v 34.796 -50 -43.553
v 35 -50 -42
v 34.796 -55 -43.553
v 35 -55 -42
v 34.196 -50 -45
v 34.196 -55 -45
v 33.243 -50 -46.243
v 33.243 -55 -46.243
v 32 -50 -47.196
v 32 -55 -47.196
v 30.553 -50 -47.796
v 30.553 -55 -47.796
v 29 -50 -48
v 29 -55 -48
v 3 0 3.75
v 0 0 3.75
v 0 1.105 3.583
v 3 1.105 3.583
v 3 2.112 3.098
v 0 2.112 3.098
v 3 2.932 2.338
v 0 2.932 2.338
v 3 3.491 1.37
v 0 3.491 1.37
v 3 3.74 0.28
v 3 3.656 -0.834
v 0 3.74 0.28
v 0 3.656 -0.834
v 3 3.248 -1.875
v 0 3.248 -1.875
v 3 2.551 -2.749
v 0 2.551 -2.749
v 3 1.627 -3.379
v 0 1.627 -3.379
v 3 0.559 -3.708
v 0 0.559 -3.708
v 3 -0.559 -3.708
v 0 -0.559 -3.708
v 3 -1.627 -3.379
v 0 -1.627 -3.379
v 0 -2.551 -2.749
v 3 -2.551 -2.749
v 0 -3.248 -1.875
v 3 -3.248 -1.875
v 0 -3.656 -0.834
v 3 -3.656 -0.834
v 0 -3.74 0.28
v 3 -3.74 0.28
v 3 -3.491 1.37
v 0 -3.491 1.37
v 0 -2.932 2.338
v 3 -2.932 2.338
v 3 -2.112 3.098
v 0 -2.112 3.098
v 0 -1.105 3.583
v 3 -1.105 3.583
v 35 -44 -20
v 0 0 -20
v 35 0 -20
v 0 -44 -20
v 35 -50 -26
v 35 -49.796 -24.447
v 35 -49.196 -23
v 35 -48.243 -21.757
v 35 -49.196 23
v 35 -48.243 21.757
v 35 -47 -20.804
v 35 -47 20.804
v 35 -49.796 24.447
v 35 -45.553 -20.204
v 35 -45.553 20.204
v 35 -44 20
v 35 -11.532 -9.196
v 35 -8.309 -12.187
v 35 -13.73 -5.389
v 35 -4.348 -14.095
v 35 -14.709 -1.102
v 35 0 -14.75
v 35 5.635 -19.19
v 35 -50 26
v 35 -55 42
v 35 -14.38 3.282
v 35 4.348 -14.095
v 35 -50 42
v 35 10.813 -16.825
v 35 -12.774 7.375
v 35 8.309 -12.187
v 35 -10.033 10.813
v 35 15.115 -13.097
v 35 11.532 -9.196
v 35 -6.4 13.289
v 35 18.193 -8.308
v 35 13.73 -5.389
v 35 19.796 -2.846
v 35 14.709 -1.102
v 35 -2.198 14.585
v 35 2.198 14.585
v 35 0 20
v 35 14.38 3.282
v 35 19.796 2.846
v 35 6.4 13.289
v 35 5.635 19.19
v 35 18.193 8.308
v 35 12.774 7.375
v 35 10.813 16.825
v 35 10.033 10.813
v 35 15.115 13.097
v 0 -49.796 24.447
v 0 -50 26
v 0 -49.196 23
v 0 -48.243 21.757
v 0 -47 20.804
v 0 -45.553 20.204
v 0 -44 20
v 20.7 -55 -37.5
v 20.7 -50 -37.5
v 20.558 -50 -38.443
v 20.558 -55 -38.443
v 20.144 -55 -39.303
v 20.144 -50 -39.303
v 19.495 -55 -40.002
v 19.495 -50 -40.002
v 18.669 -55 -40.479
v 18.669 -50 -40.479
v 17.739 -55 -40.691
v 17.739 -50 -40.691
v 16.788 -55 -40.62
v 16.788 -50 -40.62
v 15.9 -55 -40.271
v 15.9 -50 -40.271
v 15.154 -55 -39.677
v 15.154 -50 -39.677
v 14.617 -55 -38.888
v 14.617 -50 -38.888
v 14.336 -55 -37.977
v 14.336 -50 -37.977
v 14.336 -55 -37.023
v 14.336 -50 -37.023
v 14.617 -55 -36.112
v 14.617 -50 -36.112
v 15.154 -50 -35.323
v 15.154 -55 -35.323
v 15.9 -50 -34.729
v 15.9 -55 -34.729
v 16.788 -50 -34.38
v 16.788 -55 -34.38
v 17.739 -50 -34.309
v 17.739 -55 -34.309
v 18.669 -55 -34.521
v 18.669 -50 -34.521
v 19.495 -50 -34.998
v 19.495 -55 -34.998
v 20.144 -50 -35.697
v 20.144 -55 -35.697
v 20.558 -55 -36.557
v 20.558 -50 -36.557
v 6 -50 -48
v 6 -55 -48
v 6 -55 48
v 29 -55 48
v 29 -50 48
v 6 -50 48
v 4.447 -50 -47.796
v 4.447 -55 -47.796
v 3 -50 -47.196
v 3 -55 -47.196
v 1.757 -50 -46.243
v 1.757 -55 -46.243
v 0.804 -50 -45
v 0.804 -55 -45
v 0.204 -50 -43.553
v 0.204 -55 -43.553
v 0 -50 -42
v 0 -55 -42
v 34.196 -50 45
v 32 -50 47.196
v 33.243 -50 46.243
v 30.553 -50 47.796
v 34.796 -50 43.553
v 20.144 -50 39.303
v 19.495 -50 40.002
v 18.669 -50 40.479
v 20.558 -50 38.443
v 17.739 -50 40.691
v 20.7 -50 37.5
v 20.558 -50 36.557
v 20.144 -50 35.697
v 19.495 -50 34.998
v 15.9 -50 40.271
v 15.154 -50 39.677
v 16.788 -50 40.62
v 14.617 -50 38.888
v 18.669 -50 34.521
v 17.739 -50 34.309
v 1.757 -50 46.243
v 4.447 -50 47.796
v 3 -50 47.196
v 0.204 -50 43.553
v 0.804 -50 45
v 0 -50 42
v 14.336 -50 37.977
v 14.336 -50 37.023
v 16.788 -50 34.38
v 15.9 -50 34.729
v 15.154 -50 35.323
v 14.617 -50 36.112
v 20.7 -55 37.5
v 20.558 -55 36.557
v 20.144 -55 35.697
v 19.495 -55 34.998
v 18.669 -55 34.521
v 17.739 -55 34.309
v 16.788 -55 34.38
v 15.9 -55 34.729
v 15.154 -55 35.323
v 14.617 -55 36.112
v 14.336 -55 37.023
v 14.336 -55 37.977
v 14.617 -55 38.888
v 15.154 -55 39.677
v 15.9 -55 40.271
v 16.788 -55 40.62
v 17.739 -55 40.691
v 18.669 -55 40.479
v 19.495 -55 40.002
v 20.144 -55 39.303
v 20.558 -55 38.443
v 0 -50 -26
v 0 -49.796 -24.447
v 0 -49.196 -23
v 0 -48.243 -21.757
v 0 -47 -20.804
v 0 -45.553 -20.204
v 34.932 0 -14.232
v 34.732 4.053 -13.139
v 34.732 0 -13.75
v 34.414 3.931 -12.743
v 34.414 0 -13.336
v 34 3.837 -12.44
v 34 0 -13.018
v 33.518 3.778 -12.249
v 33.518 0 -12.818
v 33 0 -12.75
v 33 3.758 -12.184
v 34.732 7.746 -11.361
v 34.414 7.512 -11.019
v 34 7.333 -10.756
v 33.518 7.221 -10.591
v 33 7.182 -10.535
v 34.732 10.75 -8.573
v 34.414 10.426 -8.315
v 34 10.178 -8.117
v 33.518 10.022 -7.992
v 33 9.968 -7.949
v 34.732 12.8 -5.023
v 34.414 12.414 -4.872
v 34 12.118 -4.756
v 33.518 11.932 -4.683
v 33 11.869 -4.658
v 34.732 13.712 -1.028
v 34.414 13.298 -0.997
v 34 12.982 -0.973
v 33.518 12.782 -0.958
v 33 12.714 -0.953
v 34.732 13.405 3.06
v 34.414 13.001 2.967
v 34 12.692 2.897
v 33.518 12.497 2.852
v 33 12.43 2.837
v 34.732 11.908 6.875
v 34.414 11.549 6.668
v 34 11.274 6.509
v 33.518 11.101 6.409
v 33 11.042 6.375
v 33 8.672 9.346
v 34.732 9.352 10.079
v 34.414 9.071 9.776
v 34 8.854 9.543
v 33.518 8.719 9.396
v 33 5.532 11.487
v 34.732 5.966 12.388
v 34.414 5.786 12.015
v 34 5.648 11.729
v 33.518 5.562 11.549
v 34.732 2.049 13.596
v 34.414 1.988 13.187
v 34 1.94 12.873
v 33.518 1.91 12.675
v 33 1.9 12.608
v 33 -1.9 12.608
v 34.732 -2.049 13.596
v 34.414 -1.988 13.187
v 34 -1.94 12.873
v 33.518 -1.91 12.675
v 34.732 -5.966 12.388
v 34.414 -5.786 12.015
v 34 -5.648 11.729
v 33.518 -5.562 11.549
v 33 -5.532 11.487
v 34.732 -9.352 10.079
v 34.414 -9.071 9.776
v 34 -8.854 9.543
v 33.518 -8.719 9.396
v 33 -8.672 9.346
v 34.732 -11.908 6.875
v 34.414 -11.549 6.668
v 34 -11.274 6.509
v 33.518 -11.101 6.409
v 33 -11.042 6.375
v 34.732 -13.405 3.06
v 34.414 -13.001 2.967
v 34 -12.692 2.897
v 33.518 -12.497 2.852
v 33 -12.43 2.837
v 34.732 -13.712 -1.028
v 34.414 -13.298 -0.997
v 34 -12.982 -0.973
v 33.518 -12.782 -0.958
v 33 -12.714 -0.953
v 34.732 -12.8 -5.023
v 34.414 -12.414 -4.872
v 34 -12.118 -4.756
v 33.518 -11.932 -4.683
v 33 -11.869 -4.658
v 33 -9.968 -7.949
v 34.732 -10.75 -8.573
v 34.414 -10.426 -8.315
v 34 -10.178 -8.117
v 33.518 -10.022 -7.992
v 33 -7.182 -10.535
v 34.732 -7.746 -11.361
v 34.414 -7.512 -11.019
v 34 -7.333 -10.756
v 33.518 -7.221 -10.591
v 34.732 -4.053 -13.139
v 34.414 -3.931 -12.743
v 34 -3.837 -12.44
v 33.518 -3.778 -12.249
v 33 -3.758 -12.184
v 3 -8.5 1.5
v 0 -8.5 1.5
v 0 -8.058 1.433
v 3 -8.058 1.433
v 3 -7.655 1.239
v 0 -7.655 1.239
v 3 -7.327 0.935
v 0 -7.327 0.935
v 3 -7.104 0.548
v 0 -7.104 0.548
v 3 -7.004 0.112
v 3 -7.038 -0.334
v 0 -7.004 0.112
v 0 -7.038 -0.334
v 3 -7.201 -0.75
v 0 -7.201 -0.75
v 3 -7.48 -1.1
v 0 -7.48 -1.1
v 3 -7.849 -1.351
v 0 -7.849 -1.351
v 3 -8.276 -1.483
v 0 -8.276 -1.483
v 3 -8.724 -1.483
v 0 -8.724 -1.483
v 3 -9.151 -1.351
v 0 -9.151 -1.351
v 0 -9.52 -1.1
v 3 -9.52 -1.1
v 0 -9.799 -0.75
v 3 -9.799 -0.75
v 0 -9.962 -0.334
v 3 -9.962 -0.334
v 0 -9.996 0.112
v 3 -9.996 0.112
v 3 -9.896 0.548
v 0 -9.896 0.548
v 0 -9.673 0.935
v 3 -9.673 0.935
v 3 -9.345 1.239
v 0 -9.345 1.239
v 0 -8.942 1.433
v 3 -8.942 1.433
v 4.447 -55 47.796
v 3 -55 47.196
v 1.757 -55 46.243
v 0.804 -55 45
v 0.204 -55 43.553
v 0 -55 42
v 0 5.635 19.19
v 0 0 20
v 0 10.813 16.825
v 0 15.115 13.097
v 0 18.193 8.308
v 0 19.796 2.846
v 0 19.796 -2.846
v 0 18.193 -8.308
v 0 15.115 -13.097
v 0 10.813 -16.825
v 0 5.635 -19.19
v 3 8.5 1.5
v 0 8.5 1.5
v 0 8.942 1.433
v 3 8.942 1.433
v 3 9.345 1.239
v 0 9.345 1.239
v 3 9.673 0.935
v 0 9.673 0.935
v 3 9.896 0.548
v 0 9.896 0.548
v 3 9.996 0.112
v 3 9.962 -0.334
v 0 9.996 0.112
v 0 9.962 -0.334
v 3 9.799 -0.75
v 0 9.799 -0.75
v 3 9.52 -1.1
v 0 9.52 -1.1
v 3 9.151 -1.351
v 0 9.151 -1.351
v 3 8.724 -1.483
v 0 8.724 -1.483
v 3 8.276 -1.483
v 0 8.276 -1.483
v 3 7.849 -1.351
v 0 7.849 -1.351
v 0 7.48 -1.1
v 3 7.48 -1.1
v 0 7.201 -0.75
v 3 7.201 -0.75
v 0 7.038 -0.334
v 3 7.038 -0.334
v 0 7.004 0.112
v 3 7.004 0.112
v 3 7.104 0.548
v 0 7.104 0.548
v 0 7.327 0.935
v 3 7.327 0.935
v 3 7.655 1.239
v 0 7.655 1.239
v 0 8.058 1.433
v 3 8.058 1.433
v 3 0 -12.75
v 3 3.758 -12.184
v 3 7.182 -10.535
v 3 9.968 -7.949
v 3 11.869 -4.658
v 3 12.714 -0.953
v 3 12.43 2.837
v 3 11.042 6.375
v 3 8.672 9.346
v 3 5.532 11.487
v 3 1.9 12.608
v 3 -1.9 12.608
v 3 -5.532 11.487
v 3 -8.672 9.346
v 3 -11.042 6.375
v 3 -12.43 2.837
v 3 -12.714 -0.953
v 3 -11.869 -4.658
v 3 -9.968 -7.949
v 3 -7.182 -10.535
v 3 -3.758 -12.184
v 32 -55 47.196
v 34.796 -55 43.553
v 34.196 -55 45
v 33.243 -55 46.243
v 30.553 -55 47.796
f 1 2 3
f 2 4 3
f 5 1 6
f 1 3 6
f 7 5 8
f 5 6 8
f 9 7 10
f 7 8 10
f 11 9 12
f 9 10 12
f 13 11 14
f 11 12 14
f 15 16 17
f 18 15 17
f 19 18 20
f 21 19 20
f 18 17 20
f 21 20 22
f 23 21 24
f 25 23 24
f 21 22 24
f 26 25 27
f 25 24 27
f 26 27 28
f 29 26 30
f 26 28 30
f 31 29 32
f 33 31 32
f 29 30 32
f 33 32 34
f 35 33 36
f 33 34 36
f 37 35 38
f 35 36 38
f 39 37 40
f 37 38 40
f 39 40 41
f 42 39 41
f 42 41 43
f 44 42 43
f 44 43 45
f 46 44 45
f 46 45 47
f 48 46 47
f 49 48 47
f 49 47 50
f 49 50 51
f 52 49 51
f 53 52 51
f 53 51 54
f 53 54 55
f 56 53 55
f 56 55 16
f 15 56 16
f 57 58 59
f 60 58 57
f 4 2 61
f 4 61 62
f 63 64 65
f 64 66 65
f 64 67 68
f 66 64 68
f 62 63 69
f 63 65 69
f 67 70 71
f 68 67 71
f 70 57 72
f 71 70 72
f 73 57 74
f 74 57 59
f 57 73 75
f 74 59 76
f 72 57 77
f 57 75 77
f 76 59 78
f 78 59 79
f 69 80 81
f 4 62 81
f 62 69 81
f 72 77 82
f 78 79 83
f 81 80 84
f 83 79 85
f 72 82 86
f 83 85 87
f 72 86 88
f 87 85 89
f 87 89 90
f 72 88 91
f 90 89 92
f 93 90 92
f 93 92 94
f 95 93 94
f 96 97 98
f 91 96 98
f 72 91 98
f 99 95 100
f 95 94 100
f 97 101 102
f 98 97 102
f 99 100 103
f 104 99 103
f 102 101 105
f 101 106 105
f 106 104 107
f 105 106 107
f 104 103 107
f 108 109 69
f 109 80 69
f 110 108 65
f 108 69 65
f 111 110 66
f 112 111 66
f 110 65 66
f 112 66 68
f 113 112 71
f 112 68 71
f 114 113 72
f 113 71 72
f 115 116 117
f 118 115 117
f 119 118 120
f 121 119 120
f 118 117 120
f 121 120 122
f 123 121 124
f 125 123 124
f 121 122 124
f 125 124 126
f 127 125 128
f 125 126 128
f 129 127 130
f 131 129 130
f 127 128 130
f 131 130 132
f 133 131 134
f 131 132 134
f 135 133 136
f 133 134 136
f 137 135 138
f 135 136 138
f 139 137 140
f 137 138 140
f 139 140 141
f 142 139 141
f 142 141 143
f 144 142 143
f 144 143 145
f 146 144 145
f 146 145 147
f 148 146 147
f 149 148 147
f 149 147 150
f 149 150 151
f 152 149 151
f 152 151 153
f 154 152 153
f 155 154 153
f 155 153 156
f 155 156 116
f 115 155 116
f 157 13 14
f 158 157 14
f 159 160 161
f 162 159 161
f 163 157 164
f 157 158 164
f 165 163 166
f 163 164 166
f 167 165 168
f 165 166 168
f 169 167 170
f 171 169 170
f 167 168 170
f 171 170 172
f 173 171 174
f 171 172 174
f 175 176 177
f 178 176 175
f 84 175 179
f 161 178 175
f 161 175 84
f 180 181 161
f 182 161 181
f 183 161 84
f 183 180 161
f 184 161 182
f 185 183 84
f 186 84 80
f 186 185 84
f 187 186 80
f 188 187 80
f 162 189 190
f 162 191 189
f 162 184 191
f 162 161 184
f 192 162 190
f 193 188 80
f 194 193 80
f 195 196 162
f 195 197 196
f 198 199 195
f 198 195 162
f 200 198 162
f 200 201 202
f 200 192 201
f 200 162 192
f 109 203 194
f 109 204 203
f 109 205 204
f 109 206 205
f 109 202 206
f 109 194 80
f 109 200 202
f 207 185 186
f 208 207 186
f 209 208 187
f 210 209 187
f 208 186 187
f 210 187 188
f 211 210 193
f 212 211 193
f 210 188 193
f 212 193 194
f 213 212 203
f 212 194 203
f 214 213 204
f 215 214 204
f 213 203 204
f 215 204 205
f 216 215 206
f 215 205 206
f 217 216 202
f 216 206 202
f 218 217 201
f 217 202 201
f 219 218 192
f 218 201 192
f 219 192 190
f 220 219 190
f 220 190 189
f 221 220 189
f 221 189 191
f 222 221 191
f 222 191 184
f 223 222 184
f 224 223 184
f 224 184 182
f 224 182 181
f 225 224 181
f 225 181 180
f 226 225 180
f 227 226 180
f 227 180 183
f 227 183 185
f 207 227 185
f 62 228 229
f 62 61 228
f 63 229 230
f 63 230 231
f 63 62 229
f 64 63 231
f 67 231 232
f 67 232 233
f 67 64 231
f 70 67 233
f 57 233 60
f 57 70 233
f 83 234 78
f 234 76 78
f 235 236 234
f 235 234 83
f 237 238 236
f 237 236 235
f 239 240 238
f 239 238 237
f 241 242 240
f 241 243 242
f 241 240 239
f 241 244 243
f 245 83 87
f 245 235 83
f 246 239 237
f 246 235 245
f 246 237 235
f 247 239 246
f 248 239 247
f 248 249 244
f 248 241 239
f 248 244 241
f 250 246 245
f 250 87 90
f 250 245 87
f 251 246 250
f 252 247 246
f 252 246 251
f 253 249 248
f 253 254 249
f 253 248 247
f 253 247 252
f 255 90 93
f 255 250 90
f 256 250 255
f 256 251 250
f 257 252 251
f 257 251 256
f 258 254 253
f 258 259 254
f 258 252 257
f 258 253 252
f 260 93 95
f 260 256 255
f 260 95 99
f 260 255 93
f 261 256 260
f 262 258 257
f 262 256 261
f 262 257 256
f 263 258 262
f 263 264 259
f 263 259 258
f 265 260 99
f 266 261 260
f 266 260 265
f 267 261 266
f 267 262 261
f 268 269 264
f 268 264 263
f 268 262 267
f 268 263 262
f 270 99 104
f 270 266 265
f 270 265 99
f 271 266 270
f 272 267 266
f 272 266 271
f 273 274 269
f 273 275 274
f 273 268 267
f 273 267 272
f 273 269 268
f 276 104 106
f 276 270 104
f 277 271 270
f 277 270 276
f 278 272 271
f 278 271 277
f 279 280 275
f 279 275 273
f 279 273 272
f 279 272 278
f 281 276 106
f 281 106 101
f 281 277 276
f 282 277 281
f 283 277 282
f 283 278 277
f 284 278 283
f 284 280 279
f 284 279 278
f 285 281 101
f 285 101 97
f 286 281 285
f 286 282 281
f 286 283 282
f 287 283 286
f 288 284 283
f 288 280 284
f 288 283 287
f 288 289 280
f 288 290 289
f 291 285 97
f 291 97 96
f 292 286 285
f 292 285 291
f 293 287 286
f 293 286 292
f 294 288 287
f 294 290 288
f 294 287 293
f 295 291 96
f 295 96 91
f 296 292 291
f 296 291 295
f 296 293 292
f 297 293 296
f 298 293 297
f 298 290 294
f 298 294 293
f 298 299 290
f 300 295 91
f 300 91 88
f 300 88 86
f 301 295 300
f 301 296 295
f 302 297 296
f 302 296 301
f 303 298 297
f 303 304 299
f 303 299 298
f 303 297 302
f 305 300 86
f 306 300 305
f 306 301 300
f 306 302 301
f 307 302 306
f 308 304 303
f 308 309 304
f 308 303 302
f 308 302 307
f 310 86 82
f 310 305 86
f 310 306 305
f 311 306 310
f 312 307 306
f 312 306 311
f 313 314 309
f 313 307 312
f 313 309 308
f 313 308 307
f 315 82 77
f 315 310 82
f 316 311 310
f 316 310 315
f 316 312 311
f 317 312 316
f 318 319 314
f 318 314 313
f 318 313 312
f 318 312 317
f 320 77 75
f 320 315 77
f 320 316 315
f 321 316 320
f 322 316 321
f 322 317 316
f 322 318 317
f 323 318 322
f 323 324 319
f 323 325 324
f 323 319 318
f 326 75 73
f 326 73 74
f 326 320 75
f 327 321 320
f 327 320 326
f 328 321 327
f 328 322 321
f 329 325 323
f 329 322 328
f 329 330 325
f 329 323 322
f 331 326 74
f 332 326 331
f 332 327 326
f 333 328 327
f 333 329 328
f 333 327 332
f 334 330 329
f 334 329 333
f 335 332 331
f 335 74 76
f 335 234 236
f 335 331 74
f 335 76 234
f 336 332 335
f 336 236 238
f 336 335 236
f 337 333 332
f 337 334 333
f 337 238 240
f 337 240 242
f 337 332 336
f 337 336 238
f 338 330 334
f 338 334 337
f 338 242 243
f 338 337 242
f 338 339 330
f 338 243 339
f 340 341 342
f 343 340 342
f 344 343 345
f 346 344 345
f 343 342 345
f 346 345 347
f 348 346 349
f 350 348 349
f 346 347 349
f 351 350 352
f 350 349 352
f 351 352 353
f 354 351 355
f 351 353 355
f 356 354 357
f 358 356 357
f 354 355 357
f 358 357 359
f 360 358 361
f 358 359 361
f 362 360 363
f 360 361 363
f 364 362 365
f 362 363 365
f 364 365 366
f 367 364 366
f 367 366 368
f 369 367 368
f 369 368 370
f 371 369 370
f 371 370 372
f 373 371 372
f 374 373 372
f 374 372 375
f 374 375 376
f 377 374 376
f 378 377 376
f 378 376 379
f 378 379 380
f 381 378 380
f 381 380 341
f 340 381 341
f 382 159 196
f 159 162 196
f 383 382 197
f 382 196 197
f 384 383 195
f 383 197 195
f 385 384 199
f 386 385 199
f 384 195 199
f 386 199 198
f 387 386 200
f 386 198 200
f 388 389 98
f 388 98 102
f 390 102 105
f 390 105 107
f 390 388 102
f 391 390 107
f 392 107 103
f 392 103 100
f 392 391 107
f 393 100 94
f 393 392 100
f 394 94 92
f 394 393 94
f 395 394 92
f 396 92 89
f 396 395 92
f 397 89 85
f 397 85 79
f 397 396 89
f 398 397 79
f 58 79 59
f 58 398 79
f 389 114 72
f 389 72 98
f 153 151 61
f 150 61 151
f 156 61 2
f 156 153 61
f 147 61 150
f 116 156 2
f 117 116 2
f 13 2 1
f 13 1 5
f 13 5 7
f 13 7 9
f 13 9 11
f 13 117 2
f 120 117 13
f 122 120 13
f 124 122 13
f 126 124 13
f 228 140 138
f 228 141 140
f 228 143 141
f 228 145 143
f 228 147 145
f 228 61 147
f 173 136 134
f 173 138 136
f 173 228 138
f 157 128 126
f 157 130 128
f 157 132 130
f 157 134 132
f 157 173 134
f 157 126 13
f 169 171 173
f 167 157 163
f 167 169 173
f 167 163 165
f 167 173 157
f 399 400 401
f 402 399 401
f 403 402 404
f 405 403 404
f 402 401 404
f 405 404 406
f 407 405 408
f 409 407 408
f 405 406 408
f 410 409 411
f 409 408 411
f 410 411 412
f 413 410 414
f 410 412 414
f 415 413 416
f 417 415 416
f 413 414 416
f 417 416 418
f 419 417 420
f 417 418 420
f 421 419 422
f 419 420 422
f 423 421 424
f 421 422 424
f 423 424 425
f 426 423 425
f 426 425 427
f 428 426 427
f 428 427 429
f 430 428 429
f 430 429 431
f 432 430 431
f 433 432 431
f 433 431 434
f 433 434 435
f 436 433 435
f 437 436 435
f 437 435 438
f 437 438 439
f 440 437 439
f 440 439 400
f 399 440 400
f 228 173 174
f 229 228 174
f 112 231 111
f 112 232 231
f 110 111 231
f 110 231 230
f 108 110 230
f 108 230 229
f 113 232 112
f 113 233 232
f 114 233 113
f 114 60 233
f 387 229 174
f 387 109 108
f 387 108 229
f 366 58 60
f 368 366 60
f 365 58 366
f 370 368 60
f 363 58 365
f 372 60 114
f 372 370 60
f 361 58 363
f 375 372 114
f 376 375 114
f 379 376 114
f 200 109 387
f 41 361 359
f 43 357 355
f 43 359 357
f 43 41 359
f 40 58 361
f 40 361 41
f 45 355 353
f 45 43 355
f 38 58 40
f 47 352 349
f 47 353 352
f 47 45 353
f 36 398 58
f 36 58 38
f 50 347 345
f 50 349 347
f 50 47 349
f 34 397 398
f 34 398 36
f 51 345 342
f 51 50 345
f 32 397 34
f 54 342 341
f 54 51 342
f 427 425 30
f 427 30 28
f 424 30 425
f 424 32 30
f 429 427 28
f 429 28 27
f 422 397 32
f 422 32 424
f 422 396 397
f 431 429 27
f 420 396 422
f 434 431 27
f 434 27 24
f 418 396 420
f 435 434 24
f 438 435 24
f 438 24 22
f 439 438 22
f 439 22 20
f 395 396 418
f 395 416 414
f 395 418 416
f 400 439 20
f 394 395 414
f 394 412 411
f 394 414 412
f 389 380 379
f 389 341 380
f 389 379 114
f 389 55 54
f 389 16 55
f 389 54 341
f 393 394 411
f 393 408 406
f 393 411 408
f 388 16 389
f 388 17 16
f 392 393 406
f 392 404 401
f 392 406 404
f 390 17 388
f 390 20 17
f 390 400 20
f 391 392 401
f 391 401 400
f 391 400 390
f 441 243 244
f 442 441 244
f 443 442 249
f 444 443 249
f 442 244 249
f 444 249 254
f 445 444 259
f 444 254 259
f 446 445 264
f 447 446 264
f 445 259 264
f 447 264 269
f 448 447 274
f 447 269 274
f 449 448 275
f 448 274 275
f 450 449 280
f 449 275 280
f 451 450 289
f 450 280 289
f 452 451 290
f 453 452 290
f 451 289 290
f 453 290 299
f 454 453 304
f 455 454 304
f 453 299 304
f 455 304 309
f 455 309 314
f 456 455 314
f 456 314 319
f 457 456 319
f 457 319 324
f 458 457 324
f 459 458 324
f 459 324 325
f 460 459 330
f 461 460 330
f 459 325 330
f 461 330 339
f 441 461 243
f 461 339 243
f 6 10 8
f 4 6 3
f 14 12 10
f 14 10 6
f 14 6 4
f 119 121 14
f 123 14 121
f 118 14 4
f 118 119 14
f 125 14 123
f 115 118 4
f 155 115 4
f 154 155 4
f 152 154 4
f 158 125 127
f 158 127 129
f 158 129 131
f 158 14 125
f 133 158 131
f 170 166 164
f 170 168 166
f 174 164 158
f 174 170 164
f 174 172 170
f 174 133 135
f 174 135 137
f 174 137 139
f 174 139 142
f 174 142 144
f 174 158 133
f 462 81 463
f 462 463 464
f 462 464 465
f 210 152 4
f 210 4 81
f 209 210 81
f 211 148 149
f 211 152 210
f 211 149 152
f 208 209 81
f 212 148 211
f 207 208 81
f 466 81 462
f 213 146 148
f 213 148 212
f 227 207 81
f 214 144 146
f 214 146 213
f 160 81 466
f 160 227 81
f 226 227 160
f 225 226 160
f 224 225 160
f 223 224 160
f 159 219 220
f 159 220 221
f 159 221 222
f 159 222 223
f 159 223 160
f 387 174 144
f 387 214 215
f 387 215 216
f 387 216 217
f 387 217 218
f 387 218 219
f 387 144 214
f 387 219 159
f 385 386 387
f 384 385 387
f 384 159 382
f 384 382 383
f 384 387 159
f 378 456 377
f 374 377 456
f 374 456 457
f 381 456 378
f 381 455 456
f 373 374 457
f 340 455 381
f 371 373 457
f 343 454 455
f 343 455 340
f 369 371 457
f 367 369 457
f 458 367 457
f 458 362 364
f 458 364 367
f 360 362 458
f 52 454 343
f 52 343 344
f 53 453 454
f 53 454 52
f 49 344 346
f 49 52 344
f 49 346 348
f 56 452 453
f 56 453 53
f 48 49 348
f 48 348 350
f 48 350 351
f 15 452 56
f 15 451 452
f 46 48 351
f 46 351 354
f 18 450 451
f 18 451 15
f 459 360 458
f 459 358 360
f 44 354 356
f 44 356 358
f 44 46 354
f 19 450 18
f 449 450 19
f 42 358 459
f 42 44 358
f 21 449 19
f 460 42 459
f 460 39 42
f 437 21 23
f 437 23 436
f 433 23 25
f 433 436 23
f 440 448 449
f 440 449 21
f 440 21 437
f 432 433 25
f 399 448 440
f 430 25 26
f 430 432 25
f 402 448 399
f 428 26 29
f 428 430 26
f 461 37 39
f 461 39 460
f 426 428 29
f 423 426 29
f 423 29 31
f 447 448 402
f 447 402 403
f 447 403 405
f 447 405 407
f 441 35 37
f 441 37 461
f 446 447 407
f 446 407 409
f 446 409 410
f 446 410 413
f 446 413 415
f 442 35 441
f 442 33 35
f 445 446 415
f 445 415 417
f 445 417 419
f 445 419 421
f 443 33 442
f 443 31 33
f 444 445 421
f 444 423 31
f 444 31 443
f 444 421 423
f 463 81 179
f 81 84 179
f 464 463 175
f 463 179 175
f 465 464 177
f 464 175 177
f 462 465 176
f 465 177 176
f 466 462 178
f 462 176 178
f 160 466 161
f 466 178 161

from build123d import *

# Parameters (mm, degrees)
BOSS_EXTRUDE1_DEPTH = 35
SKETCH2_R           = 12.75
CUT_EXTRUDE1_DEPTH  = 32
CUT_EXTRUDE2_REACH  = 37
SKETCH3_R           = 1.5
SKETCH3_R_2         = 3.75
CUT_EXTRUDE3_REACH  = 7
SKETCH4_R           = 3.2
FILLET1_R           = 2
FILLET3_R           = 6
FILLET4_R           = 6


with BuildPart() as part:
    # Sketch1 → Boss-Extrude1 (new body)
    with BuildSketch(Plane(origin=(0, 0, 0), x_dir=(0, 0, -1), z_dir=(1, 0, 0))):
        with BuildLine():
            Line((-48, -55), (-48, -50))
            Line((-48, -50), (-20, -50))
            Line((-20, -50), (-20, 0))
            ThreePointArc((-20, 0), (0, 20), (20, 0))
            Line((20, 0), (20, -50))
            Line((20, -50), (48, -50))
            Line((48, -50), (48, -55))
            Line((48, -55), (-48, -55))
        make_face()
    extrude(amount=BOSS_EXTRUDE1_DEPTH)

    # Sketch2 → Cut-Extrude1 (cut)
    with BuildSketch(Plane(origin=(35, 0, 0), x_dir=(0, 0, -1), z_dir=(1, 0, 0))):
        Circle(SKETCH2_R)
    extrude(amount=-CUT_EXTRUDE1_DEPTH, mode=Mode.SUBTRACT)

    # Sketch3 → Cut-Extrude2 (cut, up to next)
    with BuildSketch(Plane.ZY, mode=Mode.PRIVATE) as cut_extrude2_sk1:
        with Locations((0, 8.5)):
            Circle(SKETCH3_R)
    cut_extrude2_tool1 = extrude(cut_extrude2_sk1.sketch, amount=-CUT_EXTRUDE2_REACH, mode=Mode.PRIVATE) & part.part
    add(cut_extrude2_tool1.solids().sort_by_distance((0, 8.5, 0))[0], mode=Mode.SUBTRACT)
    # Sketch3 → Cut-Extrude2 (cut, up to next)
    with BuildSketch(Plane.ZY, mode=Mode.PRIVATE) as cut_extrude2_sk2:
        with Locations((0, -8.5)):
            Circle(SKETCH3_R)
    cut_extrude2_tool2 = extrude(cut_extrude2_sk2.sketch, amount=-CUT_EXTRUDE2_REACH, mode=Mode.PRIVATE) & part.part
    add(cut_extrude2_tool2.solids().sort_by_distance((0, -8.5, 0))[0], mode=Mode.SUBTRACT)
    # Sketch3 → Cut-Extrude2 (cut, up to next)
    with BuildSketch(Plane.ZY, mode=Mode.PRIVATE) as cut_extrude2_sk3:
        Circle(SKETCH3_R_2)
    cut_extrude2_tool3 = extrude(cut_extrude2_sk3.sketch, amount=-CUT_EXTRUDE2_REACH, mode=Mode.PRIVATE) & part.part
    add(cut_extrude2_tool3.solids().sort_by_distance((0, 0, 0))[0], mode=Mode.SUBTRACT)

    # Sketch4 → Cut-Extrude3 (cut, up to next)
    with BuildSketch(Plane(origin=(0, -50, 0), x_dir=(1, 0, 0), z_dir=(0, 1, 0)), mode=Mode.PRIVATE) as cut_extrude3_sk1:
        with Locations((17.5, 37.5)):
            Circle(SKETCH4_R)
    cut_extrude3_tool1 = extrude(cut_extrude3_sk1.sketch, amount=-CUT_EXTRUDE3_REACH, mode=Mode.PRIVATE) & part.part
    add(cut_extrude3_tool1.solids().sort_by_distance((17.5, -50, -37.5))[0], mode=Mode.SUBTRACT)
    # Sketch4 → Cut-Extrude3 (cut, up to next)
    with BuildSketch(Plane(origin=(0, -50, 0), x_dir=(1, 0, 0), z_dir=(0, 1, 0)), mode=Mode.PRIVATE) as cut_extrude3_sk2:
        with Locations((17.5, -37.5)):
            Circle(SKETCH4_R)
    cut_extrude3_tool2 = extrude(cut_extrude3_sk2.sketch, amount=-CUT_EXTRUDE3_REACH, mode=Mode.PRIVATE) & part.part
    add(cut_extrude3_tool2.solids().sort_by_distance((17.5, -50, 37.5))[0], mode=Mode.SUBTRACT)

    # Fillet1
    fillet1_edges = [part.edges().sort_by_distance(p)[0] for p in [
        (35, 0, 12.75),
    ]]
    fillet(fillet1_edges, radius=FILLET1_R)

    # Fillet3
    fillet3_edges = [part.edges().sort_by_distance(p)[0] for p in [
        (17.5, -50, 20),
        (17.5, -50, -20),
    ]]
    fillet(fillet3_edges, radius=FILLET3_R)

    # Fillet4
    fillet4_edges = [part.edges().sort_by_distance(p)[0] for p in [
        (0, -52.5, -48),
        (35, -52.5, 48),
        (0, -52.5, 48),
        (35, -52.5, -48),
    ]]
    fillet(fillet4_edges, radius=FILLET4_R)


solid = part.part
